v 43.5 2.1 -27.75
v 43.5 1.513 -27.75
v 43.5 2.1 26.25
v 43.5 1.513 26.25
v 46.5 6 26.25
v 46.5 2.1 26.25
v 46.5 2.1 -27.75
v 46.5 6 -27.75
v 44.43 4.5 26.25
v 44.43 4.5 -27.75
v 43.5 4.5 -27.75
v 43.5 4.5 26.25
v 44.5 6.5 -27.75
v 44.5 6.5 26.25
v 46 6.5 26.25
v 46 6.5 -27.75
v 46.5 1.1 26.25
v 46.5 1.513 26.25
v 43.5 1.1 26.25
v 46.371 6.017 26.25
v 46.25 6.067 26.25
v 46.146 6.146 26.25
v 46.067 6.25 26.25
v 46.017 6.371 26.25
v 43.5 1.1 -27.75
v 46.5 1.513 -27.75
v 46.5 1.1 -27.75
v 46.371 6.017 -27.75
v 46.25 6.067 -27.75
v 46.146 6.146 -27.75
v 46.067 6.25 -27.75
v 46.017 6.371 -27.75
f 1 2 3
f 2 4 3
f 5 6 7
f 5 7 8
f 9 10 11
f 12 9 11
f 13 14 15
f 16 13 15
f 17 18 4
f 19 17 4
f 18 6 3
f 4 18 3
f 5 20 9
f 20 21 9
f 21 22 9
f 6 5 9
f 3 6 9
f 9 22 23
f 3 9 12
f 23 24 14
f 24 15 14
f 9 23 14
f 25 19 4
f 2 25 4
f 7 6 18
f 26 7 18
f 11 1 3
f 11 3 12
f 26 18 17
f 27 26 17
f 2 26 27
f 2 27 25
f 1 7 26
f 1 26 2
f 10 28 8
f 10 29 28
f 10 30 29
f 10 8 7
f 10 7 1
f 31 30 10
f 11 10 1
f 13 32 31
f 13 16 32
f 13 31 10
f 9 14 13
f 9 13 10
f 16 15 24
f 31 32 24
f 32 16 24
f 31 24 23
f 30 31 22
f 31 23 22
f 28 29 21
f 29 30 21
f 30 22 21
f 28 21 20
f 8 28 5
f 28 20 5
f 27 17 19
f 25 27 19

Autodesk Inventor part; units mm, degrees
ref_plane "YZ Plane" through (0, 0, 0) normal (1, 0, 0) x (0, 1, 0)
ref_plane "XZ Plane" through (0, 0, 0) normal (0, 1, 0) x (-1, 0, 0)
ref_plane "XY Plane" through (0, 0, 0) normal (0, 0, 1) x (1, 0, 0)
sketch "スケッチ1" plane through (43.5, 1.6, 26.25) normal (0, 0, -1) x (-1, 0, 0)
  line L0 (-3, 0.5001) -> (-3, -0.5) projected
  line L1 (0, -0.5) -> (0, 0.4999) projected
  line L2 (0, -0.0868) -> (0, 2.9) projected
  line L3 (-3, -0.0868) -> (-3, 4.4) projected
  circle A0 centre (-3, 4.9) radius 0.5 projected
  line L4 (-1, 4.9) -> (-2.5, 4.9) projected
  line L5 (-1, 4.9) -> (-0.9302, 2.9) projected
  line L6 (-0.9302, 2.9) -> (0, 2.9) projected
  line L7 (-3, -0.5) -> (0, -0.5)
  point P0 (43.5, -1.6)
  point P1 (-2.5, 4.9)
extrude "押し出し1" add sketch "スケッチ1" along normal blind 54 contours L3 A0 L4 L5 L6 L2 L1 L7 L0
properties part number "base_01"
